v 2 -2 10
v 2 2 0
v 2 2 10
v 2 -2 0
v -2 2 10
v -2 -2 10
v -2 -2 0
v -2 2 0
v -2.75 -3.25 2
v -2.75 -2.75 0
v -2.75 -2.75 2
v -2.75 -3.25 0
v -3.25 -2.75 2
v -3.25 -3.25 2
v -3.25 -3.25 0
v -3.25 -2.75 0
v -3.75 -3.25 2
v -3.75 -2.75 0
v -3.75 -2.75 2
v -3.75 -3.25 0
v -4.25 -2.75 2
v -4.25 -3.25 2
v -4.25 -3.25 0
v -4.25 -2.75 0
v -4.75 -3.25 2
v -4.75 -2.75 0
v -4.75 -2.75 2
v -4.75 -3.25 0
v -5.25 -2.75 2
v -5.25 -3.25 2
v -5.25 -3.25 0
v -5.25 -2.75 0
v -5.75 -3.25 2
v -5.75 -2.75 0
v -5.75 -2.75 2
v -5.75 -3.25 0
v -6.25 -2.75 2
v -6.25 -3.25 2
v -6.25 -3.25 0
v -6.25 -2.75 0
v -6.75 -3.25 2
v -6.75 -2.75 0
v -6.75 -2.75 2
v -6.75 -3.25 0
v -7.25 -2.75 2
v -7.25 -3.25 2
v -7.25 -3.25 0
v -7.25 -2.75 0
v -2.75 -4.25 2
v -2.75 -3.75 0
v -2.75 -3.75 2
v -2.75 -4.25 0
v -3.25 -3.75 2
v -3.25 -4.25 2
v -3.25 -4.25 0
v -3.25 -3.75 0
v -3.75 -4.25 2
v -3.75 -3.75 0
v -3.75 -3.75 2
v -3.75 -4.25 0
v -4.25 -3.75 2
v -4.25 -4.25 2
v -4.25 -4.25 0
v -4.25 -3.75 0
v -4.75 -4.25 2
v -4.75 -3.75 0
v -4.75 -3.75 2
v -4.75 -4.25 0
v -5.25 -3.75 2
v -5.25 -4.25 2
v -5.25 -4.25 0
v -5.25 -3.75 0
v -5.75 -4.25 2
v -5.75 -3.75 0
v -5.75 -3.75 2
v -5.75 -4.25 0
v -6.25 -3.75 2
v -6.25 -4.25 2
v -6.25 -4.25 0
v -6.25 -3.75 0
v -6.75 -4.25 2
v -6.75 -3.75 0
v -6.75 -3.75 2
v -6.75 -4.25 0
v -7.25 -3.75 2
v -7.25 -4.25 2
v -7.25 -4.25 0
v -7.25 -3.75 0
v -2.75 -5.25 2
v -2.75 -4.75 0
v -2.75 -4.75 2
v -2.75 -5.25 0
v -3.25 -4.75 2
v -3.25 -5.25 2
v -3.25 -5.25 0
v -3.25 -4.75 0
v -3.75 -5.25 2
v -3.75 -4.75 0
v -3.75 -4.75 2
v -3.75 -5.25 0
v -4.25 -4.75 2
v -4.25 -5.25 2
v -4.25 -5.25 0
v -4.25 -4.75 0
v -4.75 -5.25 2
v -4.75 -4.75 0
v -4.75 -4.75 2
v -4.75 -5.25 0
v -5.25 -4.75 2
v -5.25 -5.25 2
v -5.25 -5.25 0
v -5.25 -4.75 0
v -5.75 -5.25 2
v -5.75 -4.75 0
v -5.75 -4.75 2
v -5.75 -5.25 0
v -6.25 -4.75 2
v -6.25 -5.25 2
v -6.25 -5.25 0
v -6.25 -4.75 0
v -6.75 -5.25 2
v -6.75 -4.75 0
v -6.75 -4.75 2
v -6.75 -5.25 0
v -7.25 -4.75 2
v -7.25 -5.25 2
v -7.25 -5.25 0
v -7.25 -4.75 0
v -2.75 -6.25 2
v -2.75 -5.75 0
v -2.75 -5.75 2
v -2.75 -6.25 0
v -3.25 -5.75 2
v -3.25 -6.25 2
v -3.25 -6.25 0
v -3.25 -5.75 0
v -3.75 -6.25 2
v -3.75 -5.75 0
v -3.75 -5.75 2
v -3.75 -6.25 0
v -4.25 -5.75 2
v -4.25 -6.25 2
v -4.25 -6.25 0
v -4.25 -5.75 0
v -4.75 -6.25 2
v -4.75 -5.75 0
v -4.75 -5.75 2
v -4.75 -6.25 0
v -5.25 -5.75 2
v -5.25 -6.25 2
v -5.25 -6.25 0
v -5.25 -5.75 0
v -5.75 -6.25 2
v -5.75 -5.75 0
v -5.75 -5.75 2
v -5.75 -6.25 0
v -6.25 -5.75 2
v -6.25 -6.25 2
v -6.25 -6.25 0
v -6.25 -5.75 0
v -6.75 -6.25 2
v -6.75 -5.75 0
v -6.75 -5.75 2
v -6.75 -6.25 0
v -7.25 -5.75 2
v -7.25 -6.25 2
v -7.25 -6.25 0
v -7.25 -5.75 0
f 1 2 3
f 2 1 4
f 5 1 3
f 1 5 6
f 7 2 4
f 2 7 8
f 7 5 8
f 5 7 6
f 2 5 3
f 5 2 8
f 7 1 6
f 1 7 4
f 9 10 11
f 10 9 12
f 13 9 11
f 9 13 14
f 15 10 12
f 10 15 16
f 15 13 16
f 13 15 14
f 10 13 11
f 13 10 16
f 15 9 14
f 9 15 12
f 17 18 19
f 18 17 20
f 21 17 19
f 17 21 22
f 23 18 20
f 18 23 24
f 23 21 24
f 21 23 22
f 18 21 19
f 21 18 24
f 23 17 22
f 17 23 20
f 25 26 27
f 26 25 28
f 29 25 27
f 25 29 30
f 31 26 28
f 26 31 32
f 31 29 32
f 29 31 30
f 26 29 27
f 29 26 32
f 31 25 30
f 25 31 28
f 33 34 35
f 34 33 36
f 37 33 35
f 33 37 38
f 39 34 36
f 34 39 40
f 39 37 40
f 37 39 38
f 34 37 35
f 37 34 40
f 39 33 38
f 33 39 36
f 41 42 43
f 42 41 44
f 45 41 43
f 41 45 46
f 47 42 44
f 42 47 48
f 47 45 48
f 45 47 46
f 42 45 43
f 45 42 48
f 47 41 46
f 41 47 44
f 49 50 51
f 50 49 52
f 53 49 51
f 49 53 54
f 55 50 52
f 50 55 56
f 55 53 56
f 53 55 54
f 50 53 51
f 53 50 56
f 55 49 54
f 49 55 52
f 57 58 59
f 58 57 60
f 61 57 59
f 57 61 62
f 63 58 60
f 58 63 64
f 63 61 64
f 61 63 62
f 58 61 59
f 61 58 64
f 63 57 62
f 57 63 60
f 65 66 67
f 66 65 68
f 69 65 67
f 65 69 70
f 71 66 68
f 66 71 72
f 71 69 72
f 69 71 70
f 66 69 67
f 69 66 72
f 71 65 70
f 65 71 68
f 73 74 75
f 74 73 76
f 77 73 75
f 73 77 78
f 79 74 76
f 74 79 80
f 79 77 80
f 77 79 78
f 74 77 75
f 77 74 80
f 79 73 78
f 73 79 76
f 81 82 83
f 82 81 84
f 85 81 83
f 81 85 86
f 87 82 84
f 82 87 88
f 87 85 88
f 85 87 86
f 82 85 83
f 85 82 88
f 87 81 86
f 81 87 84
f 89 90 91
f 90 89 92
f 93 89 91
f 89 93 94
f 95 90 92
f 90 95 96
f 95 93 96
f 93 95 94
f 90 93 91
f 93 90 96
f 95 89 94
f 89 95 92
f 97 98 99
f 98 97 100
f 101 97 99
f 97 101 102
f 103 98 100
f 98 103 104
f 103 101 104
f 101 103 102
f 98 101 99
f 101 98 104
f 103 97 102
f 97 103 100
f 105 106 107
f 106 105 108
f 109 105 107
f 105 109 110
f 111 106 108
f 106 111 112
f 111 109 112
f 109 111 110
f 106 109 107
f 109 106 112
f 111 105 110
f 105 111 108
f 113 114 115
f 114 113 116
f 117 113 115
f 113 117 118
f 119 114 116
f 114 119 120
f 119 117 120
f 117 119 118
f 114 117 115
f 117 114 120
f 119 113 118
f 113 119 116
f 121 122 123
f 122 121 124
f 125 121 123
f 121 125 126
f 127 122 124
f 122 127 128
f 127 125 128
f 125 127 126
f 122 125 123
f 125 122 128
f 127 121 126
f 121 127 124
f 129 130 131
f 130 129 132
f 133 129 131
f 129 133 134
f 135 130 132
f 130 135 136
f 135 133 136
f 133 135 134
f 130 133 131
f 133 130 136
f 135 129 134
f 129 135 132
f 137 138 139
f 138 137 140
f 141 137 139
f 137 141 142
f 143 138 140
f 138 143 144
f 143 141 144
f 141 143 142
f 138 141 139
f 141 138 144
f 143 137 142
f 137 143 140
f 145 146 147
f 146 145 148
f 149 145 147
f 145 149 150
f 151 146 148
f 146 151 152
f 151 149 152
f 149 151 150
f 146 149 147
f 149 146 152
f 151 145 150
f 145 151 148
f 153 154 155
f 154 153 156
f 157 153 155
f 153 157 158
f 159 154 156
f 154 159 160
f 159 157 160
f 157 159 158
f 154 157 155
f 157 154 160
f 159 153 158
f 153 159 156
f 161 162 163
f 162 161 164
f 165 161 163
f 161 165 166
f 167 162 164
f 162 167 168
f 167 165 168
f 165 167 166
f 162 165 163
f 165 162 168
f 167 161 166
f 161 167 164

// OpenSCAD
translate([0, 0, 5]) color([0,1,0,0.9]) cube([4, 4, 10], center=true);
translate([-3, -3, 1]) color([1,0,0]) cube([0.5, 0.5, 2], center=true);
translate([-4, -3, 1]) color([1,0,0]) cube([0.5, 0.5, 2], center=true);
translate([-5, -3, 1]) color([1,0,0]) cube([0.5, 0.5, 2], center=true);
translate([-6, -3, 1]) color([1,0,0]) cube([0.5, 0.5, 2], center=true);
translate([-7, -3, 1]) color([1,0,0]) cube([0.5, 0.5, 2], center=true);
translate([-3, -4, 1]) color([1,0,0]) cube([0.5, 0.5, 2], center=true);
translate([-4, -4, 1]) color([1,0,0]) cube([0.5, 0.5, 2], center=true);
translate([-5, -4, 1]) color([1,0,0]) cube([0.5, 0.5, 2], center=true);
translate([-6, -4, 1]) color([1,0,0]) cube([0.5, 0.5, 2], center=true);
translate([-7, -4, 1]) color([1,0,0]) cube([0.5, 0.5, 2], center=true);
translate([-3, -5, 1]) color([1,0,0]) cube([0.5, 0.5, 2], center=true);
translate([-4, -5, 1]) color([1,0,0]) cube([0.5, 0.5, 2], center=true);
translate([-5, -5, 1]) color([1,0,0]) cube([0.5, 0.5, 2], center=true);
translate([-6, -5, 1]) color([1,0,0]) cube([0.5, 0.5, 2], center=true);
translate([-7, -5, 1]) color([1,0,0]) cube([0.5, 0.5, 2], center=true);
translate([-3, -6, 1]) color([1,0,0]) cube([0.5, 0.5, 2], center=true);
translate([-4, -6, 1]) color([1,0,0]) cube([0.5, 0.5, 2], center=true);
translate([-5, -6, 1]) color([1,0,0]) cube([0.5, 0.5, 2], center=true);
translate([-6, -6, 1]) color([1,0,0]) cube([0.5, 0.5, 2], center=true);
translate([-7, -6, 1]) color([1,0,0]) cube([0.5, 0.5, 2], center=true);
